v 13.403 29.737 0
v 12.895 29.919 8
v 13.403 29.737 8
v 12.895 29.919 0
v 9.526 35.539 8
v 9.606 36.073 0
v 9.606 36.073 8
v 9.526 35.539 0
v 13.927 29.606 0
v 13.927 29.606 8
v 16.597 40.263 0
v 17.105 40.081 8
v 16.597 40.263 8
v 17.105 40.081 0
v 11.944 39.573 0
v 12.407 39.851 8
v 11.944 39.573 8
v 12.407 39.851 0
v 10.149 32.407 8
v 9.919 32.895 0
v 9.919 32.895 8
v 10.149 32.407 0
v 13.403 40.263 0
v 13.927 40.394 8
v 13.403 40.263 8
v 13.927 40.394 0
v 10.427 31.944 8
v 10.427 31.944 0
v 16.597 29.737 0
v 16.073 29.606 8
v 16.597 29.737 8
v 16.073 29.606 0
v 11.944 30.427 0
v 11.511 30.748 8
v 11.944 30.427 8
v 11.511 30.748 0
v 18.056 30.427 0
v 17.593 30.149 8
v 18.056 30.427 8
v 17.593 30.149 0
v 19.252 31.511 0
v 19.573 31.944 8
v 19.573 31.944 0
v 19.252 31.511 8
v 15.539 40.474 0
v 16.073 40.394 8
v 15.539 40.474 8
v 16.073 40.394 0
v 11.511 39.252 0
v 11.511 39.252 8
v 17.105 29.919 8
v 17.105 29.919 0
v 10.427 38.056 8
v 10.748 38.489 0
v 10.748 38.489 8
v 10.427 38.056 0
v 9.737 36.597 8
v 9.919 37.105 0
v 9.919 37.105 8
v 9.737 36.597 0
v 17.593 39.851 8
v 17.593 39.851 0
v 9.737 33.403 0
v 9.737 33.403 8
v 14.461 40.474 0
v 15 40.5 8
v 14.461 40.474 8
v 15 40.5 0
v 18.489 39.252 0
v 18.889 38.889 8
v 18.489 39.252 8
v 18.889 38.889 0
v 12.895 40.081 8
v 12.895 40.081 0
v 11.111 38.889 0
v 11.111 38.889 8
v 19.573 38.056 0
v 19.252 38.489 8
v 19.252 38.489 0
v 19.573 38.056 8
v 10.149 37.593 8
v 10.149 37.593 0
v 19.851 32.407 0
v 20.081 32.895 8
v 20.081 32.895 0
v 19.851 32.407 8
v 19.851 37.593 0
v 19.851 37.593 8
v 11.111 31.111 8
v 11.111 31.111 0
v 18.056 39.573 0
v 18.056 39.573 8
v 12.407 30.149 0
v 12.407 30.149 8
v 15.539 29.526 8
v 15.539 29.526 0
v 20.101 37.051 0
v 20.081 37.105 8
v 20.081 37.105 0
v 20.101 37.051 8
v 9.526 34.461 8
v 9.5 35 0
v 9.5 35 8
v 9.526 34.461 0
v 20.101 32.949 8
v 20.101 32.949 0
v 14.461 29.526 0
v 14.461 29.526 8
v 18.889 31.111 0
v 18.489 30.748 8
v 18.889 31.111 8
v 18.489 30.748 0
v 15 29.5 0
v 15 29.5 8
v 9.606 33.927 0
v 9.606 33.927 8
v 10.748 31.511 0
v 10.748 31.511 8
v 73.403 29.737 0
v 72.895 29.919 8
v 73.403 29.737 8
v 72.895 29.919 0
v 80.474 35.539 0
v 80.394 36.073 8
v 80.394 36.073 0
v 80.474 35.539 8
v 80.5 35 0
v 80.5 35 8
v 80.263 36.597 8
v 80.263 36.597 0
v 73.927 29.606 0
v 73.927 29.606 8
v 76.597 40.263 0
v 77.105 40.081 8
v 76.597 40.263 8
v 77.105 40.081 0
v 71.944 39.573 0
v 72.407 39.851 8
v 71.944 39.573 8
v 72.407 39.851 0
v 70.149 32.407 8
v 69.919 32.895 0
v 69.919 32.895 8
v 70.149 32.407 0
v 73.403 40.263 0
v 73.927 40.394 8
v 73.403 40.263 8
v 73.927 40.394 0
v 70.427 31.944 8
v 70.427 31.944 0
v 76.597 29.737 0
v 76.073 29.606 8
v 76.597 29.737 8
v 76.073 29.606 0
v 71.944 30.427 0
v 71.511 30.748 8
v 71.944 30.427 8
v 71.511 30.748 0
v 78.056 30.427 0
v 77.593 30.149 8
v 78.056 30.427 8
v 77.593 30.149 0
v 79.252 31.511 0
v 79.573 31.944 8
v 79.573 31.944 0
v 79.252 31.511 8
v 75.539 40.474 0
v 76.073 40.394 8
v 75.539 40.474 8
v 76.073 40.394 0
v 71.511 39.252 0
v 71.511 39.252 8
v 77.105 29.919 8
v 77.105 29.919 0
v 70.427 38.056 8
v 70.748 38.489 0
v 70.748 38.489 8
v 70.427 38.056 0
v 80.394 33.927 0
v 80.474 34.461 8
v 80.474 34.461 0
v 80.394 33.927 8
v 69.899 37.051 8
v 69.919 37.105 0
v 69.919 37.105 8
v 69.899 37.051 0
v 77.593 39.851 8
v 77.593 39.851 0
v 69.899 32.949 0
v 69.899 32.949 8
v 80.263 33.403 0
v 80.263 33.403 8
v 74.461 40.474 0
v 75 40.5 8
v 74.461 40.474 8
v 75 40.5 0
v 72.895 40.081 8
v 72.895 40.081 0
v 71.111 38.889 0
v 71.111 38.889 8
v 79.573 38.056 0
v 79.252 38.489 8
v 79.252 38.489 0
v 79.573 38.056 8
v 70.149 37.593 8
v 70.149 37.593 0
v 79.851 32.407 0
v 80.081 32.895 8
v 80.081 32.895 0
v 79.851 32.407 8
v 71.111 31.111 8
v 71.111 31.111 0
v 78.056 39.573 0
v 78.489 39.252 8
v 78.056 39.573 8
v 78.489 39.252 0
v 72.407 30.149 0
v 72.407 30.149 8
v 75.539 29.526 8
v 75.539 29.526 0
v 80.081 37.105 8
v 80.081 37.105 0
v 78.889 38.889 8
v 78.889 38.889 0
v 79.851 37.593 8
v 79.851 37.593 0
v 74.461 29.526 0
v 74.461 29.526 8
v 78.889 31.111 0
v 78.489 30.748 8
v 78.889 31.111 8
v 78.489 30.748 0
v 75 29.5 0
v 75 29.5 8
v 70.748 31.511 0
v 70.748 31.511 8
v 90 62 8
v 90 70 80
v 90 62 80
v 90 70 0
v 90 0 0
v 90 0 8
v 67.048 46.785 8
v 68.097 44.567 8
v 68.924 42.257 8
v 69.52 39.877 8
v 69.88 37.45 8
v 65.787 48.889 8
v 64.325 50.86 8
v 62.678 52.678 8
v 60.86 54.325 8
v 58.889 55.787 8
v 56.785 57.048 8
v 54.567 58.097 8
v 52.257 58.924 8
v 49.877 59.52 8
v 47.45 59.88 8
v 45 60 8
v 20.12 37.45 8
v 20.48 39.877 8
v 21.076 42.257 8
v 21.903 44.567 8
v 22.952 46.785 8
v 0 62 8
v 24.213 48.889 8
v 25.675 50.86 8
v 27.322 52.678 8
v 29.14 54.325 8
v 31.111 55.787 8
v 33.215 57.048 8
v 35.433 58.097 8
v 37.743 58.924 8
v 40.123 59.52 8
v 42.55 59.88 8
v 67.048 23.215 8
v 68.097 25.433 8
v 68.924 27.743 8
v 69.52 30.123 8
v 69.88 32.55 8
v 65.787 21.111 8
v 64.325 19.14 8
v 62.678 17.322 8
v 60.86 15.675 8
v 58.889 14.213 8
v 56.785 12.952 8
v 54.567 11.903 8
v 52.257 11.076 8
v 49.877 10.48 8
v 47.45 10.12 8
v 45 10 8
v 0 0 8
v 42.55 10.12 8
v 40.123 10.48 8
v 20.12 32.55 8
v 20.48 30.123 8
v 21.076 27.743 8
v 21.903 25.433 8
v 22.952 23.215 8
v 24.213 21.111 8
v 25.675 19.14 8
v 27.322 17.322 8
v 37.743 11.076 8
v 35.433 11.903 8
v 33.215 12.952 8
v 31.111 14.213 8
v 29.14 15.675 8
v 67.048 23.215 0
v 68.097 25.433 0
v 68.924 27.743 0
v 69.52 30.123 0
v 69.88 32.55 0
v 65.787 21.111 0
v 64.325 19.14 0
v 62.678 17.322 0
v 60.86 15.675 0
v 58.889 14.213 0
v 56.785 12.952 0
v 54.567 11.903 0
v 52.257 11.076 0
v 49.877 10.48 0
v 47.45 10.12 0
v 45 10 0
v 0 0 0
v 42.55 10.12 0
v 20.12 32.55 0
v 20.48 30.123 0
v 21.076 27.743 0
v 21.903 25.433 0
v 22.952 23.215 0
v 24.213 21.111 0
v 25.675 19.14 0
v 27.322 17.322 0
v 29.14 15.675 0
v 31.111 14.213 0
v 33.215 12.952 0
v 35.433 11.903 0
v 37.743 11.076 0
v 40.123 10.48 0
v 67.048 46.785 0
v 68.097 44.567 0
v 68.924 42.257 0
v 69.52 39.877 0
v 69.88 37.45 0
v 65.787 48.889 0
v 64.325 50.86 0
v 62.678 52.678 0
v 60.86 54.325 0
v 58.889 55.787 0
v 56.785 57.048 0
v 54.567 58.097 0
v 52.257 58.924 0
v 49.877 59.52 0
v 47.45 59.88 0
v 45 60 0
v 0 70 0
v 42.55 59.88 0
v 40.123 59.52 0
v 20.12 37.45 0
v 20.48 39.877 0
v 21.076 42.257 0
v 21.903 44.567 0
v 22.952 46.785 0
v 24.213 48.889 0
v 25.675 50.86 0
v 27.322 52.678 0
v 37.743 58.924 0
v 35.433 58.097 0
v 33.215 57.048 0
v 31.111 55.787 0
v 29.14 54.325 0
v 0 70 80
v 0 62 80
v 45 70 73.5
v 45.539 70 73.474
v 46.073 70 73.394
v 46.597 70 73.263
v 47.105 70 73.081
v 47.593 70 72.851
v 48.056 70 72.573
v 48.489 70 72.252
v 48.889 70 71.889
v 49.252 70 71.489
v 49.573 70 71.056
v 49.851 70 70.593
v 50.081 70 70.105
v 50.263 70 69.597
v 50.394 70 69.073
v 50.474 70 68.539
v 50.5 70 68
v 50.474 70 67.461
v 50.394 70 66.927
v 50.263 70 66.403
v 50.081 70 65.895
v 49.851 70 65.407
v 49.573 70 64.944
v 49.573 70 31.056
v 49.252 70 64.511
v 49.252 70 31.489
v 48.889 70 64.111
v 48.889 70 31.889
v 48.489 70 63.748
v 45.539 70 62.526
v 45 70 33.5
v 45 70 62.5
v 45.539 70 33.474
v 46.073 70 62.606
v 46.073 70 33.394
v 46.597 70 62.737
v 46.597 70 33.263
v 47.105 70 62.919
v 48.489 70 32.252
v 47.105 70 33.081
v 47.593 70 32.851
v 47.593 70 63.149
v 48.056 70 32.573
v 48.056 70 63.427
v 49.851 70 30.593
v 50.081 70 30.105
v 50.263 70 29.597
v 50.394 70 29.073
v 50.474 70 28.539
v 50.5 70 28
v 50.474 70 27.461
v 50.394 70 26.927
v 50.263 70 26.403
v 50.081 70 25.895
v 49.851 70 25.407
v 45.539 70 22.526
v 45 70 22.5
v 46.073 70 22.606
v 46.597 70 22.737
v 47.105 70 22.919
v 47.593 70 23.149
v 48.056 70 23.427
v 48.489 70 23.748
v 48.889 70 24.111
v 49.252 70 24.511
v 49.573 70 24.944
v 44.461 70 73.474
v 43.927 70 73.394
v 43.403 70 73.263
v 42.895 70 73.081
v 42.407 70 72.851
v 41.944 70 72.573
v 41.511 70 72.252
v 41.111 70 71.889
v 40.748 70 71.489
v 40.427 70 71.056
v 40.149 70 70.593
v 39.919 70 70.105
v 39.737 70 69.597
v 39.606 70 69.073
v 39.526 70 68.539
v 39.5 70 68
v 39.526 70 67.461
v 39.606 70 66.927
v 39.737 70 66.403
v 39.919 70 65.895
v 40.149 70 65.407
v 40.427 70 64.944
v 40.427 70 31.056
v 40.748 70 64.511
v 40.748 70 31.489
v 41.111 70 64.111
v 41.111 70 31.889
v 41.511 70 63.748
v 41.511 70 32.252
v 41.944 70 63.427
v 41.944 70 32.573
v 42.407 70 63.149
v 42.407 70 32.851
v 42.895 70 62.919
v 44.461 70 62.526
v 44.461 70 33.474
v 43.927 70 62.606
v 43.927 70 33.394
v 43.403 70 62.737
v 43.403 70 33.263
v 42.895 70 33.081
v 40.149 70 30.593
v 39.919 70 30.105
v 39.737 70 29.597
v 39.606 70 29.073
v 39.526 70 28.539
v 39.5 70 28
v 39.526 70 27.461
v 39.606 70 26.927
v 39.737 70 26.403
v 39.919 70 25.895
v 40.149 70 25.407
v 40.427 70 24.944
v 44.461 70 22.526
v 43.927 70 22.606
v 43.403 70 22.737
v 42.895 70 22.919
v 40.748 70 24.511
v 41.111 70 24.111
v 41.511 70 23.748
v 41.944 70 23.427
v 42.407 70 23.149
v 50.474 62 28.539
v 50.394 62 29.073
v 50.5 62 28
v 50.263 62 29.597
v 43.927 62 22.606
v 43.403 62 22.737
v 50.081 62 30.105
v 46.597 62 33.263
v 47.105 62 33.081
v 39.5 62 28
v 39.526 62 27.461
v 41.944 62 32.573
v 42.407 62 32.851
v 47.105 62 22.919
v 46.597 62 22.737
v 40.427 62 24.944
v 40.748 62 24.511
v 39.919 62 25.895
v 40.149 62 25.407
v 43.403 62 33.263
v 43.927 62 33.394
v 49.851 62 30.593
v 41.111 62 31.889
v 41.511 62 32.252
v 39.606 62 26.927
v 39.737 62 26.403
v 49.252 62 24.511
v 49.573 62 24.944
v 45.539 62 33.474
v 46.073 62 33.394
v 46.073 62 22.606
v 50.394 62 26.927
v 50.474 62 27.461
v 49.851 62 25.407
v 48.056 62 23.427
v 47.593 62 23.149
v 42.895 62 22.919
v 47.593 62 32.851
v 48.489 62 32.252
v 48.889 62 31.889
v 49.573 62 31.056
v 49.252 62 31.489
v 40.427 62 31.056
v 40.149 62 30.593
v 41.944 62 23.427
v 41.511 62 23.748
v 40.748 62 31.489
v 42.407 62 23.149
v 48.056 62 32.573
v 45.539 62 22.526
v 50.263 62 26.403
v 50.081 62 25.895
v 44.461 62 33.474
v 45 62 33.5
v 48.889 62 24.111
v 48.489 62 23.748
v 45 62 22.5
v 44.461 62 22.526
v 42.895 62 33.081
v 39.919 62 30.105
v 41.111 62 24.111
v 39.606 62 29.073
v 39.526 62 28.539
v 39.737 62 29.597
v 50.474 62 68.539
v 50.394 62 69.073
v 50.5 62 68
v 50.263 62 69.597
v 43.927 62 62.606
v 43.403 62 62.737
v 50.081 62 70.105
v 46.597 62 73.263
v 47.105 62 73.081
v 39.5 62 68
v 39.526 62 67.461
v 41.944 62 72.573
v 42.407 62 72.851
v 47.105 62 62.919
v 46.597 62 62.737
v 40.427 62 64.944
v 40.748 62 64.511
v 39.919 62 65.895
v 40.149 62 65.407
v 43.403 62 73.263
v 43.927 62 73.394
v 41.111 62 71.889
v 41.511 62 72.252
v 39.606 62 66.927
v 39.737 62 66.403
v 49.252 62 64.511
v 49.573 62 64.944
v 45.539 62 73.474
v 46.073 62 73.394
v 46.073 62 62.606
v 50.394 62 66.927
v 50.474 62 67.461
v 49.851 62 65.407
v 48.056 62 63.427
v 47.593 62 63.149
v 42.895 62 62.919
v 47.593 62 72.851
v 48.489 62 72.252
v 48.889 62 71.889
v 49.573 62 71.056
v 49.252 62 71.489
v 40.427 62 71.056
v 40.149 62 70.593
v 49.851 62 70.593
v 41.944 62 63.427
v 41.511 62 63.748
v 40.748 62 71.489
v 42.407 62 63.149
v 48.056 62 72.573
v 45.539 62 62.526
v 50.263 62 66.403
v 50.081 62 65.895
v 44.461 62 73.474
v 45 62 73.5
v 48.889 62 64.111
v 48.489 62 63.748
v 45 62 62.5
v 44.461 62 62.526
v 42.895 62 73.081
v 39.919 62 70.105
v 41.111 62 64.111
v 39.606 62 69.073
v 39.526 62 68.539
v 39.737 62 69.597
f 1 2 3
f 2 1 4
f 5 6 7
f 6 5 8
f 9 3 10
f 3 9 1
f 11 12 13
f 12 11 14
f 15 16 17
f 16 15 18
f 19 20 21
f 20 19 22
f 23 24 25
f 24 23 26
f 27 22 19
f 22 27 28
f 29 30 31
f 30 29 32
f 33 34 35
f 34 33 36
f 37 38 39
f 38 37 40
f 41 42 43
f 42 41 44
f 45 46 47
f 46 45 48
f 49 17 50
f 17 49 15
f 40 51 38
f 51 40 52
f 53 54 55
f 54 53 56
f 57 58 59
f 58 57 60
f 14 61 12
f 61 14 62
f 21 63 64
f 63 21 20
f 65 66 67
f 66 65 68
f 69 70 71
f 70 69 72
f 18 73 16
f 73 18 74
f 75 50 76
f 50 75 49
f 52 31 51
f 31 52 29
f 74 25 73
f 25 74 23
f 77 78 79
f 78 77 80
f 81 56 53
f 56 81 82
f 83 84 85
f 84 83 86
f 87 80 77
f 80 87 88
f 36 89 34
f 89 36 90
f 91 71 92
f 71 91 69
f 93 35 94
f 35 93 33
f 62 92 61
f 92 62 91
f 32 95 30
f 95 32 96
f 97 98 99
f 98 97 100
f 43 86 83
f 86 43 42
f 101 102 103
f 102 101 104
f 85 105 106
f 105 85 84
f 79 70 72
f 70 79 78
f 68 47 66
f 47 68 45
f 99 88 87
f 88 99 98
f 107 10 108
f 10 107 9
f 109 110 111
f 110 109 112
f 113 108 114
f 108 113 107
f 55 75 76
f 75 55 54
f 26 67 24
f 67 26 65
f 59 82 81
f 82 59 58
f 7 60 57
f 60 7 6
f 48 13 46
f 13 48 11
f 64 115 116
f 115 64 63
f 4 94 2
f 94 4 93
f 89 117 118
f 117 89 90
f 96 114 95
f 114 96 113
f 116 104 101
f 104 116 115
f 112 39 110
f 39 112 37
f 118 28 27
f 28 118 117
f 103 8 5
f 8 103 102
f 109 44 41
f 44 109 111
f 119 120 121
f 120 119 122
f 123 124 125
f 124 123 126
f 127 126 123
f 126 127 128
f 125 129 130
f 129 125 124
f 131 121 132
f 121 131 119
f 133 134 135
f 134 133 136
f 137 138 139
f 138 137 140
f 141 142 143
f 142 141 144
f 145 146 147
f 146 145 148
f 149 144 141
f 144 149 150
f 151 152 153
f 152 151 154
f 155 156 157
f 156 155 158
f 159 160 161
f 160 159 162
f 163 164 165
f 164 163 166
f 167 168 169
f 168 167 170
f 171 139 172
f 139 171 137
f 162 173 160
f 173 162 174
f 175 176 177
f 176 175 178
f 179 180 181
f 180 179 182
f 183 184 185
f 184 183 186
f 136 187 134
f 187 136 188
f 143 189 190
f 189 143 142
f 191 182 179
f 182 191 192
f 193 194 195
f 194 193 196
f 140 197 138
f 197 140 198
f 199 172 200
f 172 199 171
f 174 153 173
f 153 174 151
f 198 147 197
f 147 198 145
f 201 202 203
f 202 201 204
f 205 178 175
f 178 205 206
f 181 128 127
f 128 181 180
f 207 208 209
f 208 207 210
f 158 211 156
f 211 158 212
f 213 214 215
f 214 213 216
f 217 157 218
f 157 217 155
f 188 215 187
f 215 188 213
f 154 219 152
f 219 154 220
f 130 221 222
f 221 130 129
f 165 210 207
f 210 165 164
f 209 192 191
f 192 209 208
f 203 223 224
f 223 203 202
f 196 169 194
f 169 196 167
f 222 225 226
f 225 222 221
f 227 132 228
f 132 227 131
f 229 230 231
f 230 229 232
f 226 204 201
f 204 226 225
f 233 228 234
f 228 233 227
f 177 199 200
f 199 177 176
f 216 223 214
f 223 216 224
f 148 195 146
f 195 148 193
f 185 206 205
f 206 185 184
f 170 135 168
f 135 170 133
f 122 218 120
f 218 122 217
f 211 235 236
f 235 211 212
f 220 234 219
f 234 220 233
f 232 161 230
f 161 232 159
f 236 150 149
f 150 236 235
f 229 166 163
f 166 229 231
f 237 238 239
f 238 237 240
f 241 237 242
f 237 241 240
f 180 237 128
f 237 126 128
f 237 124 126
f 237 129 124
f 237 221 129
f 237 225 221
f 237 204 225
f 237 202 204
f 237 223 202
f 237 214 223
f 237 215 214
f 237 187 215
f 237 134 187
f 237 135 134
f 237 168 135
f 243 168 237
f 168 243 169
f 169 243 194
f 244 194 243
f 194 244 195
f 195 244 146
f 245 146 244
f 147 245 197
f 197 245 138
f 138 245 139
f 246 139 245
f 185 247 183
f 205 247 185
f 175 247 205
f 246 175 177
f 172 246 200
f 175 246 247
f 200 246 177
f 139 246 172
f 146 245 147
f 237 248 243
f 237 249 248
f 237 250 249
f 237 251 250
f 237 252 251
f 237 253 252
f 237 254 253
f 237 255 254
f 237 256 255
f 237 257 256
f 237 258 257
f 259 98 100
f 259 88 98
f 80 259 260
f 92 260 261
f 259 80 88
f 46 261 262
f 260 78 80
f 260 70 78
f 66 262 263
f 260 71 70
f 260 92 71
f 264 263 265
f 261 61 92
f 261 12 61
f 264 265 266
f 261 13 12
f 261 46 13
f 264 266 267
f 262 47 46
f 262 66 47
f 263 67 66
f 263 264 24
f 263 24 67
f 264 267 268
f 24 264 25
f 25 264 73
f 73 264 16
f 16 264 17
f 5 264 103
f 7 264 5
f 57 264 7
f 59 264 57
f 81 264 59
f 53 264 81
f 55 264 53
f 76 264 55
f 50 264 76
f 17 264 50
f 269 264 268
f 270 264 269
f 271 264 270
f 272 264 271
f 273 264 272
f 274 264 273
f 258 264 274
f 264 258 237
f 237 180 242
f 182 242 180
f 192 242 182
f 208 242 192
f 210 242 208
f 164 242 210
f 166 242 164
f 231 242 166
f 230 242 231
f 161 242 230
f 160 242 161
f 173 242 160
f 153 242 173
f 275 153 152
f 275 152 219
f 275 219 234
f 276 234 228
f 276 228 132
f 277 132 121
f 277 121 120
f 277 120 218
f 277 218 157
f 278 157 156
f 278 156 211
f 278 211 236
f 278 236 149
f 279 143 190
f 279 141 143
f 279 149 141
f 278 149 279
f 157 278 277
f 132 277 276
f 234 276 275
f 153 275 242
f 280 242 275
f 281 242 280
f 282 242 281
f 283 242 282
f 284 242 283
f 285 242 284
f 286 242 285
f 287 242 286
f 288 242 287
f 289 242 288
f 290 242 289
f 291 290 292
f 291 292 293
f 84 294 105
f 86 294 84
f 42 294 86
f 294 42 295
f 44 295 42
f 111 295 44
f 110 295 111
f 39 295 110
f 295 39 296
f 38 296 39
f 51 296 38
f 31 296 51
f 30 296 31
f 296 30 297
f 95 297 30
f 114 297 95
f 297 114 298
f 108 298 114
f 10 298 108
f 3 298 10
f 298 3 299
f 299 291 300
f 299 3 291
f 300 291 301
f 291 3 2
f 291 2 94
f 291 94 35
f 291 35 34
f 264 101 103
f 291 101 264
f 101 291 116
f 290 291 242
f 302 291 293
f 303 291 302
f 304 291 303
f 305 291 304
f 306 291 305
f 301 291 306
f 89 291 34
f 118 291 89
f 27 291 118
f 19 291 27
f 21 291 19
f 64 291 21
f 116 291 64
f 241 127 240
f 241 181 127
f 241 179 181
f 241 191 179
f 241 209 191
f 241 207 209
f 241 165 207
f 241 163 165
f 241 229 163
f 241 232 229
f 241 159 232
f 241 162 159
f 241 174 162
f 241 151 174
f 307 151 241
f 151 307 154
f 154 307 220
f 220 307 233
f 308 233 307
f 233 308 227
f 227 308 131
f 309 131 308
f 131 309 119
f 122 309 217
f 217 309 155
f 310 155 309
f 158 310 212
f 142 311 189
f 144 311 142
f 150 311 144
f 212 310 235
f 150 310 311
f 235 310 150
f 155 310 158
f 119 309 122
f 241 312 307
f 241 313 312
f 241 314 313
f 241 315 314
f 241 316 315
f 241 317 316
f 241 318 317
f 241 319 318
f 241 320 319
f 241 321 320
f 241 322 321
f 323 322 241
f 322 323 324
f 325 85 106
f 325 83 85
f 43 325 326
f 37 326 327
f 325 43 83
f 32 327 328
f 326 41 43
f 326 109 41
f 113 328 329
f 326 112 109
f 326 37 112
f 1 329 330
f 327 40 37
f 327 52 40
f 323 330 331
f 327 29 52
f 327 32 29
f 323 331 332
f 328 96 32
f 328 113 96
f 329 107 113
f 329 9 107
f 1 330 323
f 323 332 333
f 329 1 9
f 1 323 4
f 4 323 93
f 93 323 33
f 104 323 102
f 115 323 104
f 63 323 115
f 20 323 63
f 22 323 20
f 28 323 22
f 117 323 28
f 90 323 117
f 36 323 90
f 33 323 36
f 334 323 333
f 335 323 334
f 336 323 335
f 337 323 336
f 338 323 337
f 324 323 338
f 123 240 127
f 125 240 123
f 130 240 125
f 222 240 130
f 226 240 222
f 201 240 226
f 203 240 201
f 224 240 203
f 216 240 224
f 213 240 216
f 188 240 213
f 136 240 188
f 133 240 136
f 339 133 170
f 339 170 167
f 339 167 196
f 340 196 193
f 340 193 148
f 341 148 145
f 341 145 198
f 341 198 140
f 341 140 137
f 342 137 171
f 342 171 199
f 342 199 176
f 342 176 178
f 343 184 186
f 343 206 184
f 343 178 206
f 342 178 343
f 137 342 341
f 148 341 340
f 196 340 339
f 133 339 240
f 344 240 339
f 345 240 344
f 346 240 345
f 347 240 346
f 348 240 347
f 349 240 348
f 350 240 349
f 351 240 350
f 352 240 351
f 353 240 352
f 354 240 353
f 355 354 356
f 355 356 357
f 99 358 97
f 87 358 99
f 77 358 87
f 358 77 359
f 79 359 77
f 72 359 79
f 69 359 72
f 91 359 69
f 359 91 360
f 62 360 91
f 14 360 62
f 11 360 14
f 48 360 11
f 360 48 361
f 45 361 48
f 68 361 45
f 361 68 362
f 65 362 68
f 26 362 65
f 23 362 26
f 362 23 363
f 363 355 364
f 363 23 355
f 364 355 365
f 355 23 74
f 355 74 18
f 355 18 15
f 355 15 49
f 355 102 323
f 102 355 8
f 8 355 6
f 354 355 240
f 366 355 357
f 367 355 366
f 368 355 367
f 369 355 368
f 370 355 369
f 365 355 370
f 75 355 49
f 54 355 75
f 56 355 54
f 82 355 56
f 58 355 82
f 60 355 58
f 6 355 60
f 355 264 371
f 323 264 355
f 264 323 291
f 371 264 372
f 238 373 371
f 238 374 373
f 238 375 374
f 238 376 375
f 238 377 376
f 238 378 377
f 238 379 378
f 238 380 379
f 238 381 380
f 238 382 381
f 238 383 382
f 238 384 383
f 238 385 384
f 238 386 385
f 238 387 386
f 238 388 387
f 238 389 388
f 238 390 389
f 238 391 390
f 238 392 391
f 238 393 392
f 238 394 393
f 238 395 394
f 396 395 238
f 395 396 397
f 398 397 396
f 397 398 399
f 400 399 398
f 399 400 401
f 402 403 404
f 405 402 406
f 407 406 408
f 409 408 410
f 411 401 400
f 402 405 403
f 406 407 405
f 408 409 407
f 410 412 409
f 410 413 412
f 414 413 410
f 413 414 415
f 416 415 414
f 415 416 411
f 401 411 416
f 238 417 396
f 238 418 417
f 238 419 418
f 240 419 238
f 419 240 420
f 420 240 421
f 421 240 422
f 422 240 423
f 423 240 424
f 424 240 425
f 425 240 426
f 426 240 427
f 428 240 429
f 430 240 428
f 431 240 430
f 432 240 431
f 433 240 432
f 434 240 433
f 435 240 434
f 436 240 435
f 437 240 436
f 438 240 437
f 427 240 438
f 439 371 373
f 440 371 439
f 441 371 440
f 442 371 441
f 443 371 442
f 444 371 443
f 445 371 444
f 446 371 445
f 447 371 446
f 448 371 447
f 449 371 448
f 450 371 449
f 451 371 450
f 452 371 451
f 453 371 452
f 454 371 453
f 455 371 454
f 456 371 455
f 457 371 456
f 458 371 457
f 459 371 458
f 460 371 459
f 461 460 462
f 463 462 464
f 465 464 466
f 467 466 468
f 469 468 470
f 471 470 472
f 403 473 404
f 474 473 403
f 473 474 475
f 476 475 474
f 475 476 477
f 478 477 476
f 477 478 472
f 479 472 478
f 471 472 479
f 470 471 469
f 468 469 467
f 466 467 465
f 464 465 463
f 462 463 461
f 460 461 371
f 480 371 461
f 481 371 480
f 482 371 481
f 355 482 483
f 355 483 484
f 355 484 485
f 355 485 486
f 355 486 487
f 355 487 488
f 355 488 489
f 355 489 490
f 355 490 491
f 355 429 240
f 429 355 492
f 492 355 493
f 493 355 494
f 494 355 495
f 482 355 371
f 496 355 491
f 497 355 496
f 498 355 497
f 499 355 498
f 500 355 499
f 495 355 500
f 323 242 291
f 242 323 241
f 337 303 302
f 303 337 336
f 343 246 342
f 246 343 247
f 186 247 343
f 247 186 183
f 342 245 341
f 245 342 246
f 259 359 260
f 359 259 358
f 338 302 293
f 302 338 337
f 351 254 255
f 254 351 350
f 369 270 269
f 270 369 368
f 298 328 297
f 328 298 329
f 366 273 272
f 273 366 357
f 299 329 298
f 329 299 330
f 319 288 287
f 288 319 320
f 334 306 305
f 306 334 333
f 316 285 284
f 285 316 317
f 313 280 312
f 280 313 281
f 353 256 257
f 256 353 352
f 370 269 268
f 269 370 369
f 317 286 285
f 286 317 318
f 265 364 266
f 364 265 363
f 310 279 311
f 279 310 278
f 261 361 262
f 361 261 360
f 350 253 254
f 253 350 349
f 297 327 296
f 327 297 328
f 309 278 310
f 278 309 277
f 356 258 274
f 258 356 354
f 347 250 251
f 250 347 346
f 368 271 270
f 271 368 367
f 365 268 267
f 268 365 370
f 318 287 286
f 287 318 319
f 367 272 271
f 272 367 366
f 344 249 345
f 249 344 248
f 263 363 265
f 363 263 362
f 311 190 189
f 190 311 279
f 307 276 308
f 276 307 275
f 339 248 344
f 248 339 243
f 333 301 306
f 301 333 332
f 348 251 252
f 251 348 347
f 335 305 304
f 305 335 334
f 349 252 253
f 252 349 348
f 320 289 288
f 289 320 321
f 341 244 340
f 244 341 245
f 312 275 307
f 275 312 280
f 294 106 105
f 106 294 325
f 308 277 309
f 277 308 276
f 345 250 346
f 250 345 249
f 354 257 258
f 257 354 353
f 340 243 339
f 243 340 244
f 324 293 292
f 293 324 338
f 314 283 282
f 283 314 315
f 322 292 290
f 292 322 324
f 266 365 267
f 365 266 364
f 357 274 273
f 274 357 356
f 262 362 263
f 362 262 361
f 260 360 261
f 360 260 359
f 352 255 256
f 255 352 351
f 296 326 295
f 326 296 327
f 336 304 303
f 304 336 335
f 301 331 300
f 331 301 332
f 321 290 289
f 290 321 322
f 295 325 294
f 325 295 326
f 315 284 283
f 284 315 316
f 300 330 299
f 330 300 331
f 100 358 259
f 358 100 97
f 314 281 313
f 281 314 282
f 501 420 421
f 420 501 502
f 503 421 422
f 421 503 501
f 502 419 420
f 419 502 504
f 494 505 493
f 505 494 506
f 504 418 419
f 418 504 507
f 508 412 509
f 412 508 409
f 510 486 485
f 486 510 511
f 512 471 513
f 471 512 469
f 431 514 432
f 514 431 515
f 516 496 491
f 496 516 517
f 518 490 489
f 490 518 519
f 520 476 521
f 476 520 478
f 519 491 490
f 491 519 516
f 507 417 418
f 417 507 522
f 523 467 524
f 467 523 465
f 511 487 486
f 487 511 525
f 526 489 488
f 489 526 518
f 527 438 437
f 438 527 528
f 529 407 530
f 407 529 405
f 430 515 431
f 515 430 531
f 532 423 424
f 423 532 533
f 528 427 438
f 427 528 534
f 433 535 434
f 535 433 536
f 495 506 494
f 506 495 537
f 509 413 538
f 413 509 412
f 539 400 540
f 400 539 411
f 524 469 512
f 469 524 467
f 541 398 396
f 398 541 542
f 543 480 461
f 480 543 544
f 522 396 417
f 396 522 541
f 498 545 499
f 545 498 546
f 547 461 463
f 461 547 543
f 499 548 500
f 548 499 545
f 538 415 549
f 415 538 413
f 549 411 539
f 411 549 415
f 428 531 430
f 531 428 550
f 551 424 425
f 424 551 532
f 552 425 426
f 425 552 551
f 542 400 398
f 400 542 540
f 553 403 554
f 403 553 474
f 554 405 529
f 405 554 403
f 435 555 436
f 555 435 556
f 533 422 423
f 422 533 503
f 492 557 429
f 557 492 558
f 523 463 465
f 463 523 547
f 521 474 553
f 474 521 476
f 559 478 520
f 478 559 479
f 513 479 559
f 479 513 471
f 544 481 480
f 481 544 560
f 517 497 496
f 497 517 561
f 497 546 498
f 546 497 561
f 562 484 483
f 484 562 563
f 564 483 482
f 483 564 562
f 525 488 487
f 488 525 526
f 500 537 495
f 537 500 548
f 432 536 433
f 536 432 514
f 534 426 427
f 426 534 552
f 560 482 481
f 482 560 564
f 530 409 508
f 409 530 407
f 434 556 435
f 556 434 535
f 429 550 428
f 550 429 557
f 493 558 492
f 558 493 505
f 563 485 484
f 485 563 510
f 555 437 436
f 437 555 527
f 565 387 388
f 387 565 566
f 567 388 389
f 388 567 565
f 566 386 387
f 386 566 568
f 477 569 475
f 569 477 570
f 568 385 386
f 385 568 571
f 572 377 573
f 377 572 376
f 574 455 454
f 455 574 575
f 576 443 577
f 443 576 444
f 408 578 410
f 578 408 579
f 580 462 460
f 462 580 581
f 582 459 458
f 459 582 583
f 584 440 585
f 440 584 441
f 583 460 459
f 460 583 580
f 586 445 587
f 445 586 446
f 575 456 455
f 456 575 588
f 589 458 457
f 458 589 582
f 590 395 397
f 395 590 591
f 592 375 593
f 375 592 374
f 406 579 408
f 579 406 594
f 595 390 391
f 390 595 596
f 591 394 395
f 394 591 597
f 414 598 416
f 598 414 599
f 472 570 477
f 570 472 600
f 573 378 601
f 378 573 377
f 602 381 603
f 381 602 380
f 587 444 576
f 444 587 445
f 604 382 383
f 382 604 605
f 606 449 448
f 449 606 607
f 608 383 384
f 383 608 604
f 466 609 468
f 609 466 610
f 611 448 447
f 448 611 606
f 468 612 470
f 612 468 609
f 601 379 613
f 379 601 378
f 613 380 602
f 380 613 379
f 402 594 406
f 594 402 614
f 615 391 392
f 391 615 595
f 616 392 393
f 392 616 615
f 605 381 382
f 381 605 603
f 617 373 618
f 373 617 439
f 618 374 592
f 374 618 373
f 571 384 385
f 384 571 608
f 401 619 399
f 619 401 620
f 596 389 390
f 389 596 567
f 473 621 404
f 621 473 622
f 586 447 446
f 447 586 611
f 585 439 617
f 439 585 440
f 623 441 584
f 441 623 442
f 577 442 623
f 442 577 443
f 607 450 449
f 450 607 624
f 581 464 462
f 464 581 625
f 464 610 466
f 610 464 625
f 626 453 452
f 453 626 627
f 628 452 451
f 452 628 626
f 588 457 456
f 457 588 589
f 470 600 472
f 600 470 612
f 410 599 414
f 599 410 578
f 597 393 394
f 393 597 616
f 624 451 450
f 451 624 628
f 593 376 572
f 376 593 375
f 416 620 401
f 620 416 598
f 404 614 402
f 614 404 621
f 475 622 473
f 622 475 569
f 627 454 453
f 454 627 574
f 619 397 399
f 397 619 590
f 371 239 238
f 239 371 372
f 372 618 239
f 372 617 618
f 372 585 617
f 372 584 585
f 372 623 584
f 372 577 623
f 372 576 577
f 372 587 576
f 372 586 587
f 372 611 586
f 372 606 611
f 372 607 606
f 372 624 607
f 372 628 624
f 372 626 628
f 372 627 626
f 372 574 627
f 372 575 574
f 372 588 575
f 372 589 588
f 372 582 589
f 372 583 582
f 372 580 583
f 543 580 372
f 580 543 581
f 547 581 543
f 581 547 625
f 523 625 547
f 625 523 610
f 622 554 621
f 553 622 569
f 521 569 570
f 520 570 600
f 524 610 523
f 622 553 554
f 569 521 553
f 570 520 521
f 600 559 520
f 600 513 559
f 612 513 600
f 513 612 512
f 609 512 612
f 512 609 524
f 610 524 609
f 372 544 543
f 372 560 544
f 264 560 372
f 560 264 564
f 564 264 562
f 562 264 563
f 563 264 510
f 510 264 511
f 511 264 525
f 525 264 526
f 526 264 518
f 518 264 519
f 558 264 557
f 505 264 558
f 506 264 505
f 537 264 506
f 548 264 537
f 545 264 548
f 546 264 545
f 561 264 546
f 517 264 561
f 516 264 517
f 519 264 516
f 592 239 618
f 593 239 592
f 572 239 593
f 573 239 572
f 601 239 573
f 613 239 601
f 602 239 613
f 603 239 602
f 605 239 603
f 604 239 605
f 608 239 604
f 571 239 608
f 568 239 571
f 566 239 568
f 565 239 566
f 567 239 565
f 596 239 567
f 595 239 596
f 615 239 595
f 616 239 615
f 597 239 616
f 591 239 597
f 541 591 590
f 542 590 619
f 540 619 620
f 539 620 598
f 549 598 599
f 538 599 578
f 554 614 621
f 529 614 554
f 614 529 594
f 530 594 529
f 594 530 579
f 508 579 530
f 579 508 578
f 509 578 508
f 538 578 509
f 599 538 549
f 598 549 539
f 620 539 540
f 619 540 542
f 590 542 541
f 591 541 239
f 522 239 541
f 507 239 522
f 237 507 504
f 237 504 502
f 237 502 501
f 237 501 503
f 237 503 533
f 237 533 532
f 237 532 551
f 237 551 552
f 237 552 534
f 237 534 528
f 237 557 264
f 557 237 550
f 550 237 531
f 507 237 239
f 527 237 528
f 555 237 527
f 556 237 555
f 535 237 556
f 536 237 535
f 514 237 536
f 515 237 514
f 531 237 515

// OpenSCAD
// 944 EV — MOTOR MOUNT BRACKET (parametric)
// Ties an EM57 mounting boss to a 944 crossmember hardpoint through a rubber/poly
// isolator, and reacts motor torque. Make 2-3 (mirror as needed). All dims mm --
// MEASURE the motor bosses + crossmember on the car. Steel weldment (or CNC plate
// then weld). Add gussets at the base/upright joint (see spec). Preview: motor-mount.svg.

/* ---- FRAME-SIDE BASE (bolts to crossmember) ---- */
base_L = 90;     // along the crossmember
base_W = 70;     // depth (toward the motor)
base_t = 8;
frame_bolt_d  = 11;
frame_bolt_dx = 60;     // spacing of the 2 frame bolts
iso_bore_d    = 50;     // isolator/bushing pocket through the base (0 = none)

/* ---- MOTOR-SIDE UPRIGHT (bolts to motor boss) ---- */
up_H = 80;
up_t = 8;
motor_bolt_d  = 11;
motor_bolt_dz = 40;     // vertical spacing of the 2 motor bolts
motor_bolt_z0 = 28;     // first motor bolt height above base

$fn = 64;

module mount() {
  // frame base
  difference() {
    cube([base_L, base_W, base_t]);
    for (x = [base_L/2 - frame_bolt_dx/2, base_L/2 + frame_bolt_dx/2])
      translate([x, base_W/2, -1]) cylinder(d = frame_bolt_d, h = base_t + 2);
    if (iso_bore_d > 0)
      translate([base_L/2, base_W/2, -1]) cylinder(d = iso_bore_d, h = base_t + 2);
  }
  // motor upright at the rear edge
  translate([0, base_W - up_t, 0])
    difference() {
      cube([base_L, up_t, up_H]);
      for (z = [motor_bolt_z0, motor_bolt_z0 + motor_bolt_dz])
        translate([base_L/2, up_t + 1, z]) rotate([90, 0, 0])
          cylinder(d = motor_bolt_d, h = up_t + 2);
    }
}

mount();
// Export STL for reference; the real mount is a measured weldment off the car.
